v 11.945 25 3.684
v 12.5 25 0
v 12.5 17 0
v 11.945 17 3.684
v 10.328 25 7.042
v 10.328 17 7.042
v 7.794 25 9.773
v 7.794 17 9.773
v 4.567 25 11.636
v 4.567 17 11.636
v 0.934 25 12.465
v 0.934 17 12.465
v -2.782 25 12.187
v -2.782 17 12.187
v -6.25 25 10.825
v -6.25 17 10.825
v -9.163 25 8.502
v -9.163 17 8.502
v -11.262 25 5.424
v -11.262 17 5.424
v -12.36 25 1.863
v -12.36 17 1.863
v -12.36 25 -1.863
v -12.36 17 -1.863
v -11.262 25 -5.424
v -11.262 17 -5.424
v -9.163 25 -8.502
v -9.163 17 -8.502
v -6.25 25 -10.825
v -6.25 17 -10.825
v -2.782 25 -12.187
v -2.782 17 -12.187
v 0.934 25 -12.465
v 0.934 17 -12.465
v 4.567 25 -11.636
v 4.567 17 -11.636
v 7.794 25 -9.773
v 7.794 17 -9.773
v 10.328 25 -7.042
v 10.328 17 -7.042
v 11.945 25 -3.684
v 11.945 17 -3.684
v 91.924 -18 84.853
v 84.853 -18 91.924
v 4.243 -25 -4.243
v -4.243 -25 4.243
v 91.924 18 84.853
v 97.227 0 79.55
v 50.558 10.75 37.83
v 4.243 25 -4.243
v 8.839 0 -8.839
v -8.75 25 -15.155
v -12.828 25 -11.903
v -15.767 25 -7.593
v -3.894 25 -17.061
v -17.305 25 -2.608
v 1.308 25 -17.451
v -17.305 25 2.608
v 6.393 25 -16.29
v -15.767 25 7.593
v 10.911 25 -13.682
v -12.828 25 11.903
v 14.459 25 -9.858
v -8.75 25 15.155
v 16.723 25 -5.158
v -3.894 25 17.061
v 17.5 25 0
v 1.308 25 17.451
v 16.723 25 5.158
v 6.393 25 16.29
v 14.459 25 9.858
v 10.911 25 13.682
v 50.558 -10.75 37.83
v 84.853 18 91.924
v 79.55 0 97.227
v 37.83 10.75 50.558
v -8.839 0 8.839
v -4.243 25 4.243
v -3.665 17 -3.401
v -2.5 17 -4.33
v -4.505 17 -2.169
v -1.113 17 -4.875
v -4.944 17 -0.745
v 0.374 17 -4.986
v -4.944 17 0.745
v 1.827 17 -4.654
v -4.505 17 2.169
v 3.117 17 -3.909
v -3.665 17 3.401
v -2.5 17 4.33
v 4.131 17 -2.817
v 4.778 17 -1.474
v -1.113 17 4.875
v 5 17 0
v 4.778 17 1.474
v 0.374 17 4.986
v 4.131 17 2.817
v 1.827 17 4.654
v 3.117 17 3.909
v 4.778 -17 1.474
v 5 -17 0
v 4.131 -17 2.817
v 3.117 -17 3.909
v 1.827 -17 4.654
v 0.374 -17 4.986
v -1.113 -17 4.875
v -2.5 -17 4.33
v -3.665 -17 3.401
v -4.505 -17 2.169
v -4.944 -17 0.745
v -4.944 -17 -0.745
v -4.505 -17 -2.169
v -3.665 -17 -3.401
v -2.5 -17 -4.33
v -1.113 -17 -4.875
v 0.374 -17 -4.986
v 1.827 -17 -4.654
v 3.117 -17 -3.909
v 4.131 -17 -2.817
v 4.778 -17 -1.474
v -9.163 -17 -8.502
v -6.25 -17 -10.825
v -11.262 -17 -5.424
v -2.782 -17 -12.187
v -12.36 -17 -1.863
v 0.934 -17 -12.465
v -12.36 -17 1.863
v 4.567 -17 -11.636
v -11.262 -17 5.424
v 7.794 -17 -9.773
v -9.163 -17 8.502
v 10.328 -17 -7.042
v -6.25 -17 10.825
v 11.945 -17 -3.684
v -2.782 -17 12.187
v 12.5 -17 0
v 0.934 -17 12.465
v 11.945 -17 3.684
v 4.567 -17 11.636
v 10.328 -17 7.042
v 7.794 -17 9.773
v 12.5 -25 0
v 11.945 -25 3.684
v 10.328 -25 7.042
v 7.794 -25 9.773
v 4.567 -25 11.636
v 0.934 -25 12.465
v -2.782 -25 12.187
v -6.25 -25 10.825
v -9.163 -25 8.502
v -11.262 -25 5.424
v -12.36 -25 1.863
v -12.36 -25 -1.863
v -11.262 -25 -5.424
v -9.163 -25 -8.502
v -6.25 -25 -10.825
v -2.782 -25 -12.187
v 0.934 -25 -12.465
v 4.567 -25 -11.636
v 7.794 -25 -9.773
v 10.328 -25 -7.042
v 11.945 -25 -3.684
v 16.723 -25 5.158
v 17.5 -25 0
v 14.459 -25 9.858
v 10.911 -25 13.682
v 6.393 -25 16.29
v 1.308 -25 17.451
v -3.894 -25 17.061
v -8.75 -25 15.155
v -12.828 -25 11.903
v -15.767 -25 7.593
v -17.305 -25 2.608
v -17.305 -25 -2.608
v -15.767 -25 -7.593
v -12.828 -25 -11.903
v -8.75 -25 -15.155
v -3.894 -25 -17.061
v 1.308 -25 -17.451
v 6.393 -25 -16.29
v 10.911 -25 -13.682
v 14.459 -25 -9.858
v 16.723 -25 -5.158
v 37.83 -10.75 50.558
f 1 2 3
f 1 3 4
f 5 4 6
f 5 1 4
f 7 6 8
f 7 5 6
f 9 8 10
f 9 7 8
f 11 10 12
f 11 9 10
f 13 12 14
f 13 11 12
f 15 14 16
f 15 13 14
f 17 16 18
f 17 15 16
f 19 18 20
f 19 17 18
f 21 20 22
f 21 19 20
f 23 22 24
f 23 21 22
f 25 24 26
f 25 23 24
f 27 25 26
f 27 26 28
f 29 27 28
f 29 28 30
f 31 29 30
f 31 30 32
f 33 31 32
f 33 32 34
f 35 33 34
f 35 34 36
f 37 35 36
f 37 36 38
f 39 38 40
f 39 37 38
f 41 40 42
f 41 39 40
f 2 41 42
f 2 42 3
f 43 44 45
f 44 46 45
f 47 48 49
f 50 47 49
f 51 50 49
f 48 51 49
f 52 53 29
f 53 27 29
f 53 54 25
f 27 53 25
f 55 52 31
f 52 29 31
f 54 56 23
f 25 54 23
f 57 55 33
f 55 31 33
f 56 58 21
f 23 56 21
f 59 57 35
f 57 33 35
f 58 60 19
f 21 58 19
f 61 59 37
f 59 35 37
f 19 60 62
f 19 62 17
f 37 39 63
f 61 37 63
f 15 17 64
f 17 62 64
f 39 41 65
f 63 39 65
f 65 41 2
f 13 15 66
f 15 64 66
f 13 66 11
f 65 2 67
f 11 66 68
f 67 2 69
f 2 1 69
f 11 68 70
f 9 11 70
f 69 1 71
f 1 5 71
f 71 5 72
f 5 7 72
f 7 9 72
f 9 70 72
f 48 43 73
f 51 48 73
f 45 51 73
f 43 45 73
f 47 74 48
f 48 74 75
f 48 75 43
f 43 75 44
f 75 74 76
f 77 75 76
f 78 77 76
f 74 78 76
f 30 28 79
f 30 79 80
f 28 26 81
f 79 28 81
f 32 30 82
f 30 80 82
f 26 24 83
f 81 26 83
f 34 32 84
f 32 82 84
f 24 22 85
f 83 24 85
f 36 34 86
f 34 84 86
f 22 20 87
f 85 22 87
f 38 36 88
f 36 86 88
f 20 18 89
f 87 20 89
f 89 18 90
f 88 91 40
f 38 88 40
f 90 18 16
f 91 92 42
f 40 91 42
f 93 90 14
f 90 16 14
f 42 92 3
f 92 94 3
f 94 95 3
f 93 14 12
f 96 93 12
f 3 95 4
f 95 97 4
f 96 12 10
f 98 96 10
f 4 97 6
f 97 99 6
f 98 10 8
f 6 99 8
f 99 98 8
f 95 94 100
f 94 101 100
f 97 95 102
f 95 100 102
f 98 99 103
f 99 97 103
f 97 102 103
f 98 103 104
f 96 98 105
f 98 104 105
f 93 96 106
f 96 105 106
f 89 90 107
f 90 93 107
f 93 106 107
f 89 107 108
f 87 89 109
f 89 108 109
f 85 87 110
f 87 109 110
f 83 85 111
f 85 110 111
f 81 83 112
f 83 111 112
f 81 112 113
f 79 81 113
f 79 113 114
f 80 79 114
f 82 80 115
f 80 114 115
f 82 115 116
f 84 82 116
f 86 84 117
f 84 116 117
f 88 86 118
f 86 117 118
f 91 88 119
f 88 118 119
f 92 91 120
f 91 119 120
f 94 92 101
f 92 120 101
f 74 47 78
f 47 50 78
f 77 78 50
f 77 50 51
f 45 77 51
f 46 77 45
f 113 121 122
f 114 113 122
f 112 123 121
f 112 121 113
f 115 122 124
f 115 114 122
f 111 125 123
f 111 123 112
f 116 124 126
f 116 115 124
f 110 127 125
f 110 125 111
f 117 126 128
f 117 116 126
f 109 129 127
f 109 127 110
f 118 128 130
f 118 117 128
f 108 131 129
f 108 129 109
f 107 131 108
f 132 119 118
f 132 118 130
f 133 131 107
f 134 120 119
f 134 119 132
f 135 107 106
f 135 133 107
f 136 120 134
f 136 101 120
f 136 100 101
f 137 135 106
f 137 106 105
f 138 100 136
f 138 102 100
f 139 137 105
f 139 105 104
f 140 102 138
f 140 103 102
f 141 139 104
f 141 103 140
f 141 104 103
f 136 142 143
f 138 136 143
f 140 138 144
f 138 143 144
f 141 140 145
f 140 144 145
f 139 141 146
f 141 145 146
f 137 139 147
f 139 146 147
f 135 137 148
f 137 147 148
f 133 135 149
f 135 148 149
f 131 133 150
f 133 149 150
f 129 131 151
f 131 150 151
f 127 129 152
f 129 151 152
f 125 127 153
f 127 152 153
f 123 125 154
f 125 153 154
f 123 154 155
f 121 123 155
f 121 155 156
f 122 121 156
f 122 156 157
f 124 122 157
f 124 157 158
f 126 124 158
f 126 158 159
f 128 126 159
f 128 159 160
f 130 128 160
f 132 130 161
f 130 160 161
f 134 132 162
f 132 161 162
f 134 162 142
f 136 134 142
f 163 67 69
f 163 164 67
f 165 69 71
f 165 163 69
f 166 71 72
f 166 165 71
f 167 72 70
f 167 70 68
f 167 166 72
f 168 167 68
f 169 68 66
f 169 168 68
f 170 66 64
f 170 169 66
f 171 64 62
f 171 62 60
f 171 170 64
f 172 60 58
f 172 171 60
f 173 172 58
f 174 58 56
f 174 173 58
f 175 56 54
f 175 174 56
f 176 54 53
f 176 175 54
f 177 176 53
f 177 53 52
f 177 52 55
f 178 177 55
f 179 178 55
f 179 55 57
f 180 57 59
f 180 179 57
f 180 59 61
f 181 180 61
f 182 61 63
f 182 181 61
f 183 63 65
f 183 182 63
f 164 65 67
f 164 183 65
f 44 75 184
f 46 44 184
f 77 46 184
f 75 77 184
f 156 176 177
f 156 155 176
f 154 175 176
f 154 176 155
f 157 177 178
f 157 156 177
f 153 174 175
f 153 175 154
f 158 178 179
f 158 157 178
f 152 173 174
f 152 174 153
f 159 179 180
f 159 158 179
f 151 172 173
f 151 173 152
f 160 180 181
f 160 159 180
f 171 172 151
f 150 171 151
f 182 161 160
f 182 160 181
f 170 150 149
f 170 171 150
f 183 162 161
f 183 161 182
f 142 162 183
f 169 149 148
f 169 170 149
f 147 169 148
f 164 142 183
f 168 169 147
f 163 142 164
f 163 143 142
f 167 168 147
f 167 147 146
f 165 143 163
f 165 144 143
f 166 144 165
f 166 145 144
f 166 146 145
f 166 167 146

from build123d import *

# Parameters (mm, degrees)
F1_R     = 17.5
F1_R_2   = 5
F2_DEPTH = 25
F3_R     = 12.5
F4_DEPTH = 8


with BuildPart() as f2:
    # F1 (on Front) → F2 (new body)
    with BuildSketch(Plane.XZ):
        Circle(F1_R)
        Circle(F1_R_2, mode=Mode.SUBTRACT)
    extrude(amount=F2_DEPTH)

    # F3 (on face) → F4 (cut)
    with BuildSketch(Plane.XZ.offset(25)):
        Circle(F3_R)
    extrude(amount=-F4_DEPTH, mode=Mode.SUBTRACT)

    # F5: F2 across plane


with BuildPart() as f2_1:
    add(f2.part)
    add(f2.part.mirror(Plane.XZ))


with BuildPart() as f10:
    # F7 (on face) → F10 section 0
    with BuildSketch(Plane(origin=(88.388348, 0, 88.388348), x_dir=(0, 1, 0), z_dir=(0.707107, 0, 0.707107))):
        Polygon((18, 5), (0, 12.5), (-18, 5), (-18, -5), (0, -12.5), (18, -5), align=None)
    # F9 (on face) → F10 section 1
    with BuildSketch(Plane(origin=(0, 0, 0), x_dir=(0, 1, 0), z_dir=(0.707107, 0, 0.707107))):
        Polygon((0, 12.5), (-25, 6), (-25, -6), (0, -12.5), (25, -6), (25, 6), align=None)
    loft()


solid = Compound([f2_1.part, f10.part])
